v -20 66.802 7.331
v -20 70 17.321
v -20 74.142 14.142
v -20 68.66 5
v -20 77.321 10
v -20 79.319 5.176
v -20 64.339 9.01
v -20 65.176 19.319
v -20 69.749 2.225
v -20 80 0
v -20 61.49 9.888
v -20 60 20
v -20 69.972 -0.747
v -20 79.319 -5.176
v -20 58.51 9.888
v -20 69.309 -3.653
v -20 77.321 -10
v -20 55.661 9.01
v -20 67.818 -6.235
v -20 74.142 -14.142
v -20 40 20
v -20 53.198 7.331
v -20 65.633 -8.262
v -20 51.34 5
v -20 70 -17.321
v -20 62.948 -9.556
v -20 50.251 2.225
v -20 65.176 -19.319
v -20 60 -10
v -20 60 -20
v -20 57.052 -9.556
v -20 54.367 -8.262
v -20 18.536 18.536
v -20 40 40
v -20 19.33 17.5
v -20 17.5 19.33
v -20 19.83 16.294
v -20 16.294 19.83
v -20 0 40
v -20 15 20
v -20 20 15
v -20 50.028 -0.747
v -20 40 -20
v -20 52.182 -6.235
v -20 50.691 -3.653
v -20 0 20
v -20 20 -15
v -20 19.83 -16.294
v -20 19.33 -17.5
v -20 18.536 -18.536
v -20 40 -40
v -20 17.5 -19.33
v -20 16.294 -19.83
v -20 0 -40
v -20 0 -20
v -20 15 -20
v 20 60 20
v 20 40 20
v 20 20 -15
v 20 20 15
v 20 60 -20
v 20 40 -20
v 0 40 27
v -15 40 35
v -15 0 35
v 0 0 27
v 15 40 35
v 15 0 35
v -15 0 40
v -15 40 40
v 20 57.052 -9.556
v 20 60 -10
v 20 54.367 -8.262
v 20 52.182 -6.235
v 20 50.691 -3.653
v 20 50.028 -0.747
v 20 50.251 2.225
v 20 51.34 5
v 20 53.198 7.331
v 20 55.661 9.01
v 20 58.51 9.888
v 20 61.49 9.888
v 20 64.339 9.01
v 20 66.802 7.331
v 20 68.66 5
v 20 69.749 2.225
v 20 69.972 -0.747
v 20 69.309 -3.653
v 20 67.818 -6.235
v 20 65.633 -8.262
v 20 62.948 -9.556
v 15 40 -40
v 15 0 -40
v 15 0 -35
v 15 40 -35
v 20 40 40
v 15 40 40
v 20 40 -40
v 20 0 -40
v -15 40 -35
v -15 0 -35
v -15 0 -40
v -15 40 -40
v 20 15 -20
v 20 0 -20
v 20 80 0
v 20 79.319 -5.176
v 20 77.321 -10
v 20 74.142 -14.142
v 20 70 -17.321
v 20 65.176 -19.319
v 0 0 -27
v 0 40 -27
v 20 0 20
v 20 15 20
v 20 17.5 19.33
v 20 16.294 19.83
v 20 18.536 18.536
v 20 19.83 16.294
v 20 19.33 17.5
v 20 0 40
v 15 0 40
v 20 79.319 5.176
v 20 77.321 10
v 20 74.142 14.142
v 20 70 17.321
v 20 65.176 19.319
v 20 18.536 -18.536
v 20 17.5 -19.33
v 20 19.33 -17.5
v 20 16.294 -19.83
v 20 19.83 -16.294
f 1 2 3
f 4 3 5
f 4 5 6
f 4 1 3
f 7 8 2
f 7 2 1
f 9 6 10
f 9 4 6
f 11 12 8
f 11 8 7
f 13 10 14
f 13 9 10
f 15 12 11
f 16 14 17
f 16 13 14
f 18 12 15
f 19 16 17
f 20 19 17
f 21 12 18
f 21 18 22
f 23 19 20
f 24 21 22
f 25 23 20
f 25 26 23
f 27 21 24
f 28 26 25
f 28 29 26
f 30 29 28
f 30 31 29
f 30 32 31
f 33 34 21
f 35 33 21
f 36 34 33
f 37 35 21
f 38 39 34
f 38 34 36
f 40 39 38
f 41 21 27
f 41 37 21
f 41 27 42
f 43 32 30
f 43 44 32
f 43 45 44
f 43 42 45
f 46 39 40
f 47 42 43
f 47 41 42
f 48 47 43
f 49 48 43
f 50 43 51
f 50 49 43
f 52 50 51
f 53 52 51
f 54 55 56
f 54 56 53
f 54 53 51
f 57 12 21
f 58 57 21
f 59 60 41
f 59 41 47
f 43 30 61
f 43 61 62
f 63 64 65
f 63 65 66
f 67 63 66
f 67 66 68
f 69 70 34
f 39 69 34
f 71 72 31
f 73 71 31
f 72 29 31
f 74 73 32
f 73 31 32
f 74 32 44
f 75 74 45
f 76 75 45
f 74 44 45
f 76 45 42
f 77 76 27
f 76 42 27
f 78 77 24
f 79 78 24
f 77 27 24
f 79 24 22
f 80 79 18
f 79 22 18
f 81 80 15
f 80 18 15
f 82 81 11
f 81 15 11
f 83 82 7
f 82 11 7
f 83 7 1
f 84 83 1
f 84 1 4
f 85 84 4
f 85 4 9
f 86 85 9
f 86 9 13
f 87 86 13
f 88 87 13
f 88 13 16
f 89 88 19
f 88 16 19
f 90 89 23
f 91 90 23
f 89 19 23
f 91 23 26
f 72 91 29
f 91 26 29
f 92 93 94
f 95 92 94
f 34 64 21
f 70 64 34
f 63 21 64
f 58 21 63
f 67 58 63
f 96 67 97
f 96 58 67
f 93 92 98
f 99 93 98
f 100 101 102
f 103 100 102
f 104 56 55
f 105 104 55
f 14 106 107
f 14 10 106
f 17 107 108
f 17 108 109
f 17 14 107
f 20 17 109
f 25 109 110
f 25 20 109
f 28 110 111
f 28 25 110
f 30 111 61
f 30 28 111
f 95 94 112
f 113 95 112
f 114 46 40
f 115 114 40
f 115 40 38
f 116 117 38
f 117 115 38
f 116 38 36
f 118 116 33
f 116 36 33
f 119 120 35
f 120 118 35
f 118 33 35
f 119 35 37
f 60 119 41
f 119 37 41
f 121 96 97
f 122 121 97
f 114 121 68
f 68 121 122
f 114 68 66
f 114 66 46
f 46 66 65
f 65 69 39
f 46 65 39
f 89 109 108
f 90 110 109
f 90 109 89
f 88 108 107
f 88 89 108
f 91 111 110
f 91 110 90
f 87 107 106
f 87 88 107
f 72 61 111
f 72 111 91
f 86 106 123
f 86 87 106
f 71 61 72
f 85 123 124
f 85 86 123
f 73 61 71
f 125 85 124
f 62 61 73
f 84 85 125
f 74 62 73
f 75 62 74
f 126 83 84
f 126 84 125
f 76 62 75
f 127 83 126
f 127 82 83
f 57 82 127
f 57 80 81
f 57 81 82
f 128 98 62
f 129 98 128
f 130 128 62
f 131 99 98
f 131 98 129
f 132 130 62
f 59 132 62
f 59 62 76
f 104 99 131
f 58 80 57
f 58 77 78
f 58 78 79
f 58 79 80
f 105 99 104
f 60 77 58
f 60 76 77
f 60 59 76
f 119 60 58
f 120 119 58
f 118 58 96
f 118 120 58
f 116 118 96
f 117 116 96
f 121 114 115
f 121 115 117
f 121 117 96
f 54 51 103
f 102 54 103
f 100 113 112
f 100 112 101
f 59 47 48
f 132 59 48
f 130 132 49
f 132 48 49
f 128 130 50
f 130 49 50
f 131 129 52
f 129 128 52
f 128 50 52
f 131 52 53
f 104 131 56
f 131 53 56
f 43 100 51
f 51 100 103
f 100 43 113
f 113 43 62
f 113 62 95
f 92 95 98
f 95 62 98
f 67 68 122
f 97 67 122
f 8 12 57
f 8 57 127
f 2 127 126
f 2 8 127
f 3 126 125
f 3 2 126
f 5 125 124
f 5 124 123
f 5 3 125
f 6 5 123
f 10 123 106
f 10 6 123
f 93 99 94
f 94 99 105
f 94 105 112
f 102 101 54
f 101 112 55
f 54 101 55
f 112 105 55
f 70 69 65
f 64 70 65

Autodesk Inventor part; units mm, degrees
ref_plane "YZ Plane" through (0, 0, 0) normal (1, 0, 0) x (0, 1, 0)
ref_plane "XZ Plane" through (0, 0, 0) normal (0, 1, 0) x (-1, 0, 0)
ref_plane "XY Plane" through (0, 0, 0) normal (0, 0, 1) x (1, 0, 0)
sketch "Esboço1" plane through (0, 0, 0) normal (0, 1, 0) x (-1, 0, 0)
  line L0 (20, -40) -> (-20, -40)
  line L1 (-20, -40) -> (-20, 40)
  line L2 (-20, 40) -> (20, 40)
  line L3 (20, 40) -> (20, -40)
  line L4 (20, -40) -> (-20, 40) construction
  line L5 (-20, -40) -> (20, 40) construction
  point P0 (0, 0)
  dimension "d0" = 40
  dimension "d1" = 80
extrude "Extrusão1" add sketch "Esboço1" along normal blind 80
sketch "Esboço2" plane through (20, 0, 40) normal (1, 0, 0) x (0, 0, -1)
  line L0 (0, 80) -> (20, 80)
  line L1 (20, 80) -> (20, 40)
  line L2 (20, 40) -> (0, 40)
  line L3 (0, 40) -> (0, 80)
  line L4 (80, 80) -> (60, 80)
  line L5 (60, 80) -> (60, 40)
  line L6 (60, 40) -> (80, 40)
  line L7 (80, 40) -> (80, 80)
  line L8 (0, 0) -> (80, 0) projected
  point P0 (40, 0)
  dimension "d4" = 20
  dimension "d5" = 20
  dimension "d6" = 40
extrude "Extrusão2" cut sketch "Esboço2" against normal through all contours L0 L1 L2 L3
extrude "Extrusão3" cut sketch "Esboço2" against normal through all contours L7 L6 L5 L4
fillet "Arredondamento1" radius 20 2 edges at (0, 80, 20) (0, 80, -20)
sketch "Esboço3" plane through (20, 0, 40) normal (1, 0, 0) x (0, 0, -1)
  arc A0 (60, 60) -> (20, 60) centre (40, 60) ccw projected
  point P0 (40, 0)
hole "Furo1" at (20, 60, 0) direction (-1, 0, 0) diameter 20 end through all
sketch "Esboço4" plane through (20, 40, 40) normal (0, 1, 0) x (1, 0, 0)
  line L0 (-35, 0) -> (-35, 5)
  line L1 (-35, 5) -> (-20, 13)
  line L2 (-20, 13) -> (-5, 5)
  line L3 (-5, 5) -> (-5, 0)
  line L4 (-40, 0) -> (-40, 20) projected
  line L5 (0, 0) -> (-40, 0) projected
  point P0 (-20, 40)
  dimension "d19" = 5
  dimension "d20" = 30
  dimension "d21" = 20
  dimension "d22" = 13
  dimension "d23" = 5
extrude "Extrusão4" cut sketch "Esboço4" against normal through all
mirror "Espelhar1" about plane through (0, 0, 0) normal (0, 0, 1) of "Extrusão4"
sketch "Esboço6" plane through (20, 0, 40) normal (1, 0, 0) x (0, 0, -1)
  line L0 (20, 20) -> (60, 20)
  line L1 (60, 20) -> (60, 0)
  line L2 (60, 0) -> (20, 0)
  line L3 (20, 0) -> (20, 20)
  line L4 (0, 0) -> (80, 0) projected
  point P0 (40, 0)
  point P1 (40, 0)
  dimension "d26" = 40
  dimension "d27" = 20
extrude "Extrusão5" cut sketch "Esboço6" against normal through all
fillet "Arredondamento2" radius 5 2 edges at (0, 20, -20) (0, 20, 20)
properties part number "3D Model"
